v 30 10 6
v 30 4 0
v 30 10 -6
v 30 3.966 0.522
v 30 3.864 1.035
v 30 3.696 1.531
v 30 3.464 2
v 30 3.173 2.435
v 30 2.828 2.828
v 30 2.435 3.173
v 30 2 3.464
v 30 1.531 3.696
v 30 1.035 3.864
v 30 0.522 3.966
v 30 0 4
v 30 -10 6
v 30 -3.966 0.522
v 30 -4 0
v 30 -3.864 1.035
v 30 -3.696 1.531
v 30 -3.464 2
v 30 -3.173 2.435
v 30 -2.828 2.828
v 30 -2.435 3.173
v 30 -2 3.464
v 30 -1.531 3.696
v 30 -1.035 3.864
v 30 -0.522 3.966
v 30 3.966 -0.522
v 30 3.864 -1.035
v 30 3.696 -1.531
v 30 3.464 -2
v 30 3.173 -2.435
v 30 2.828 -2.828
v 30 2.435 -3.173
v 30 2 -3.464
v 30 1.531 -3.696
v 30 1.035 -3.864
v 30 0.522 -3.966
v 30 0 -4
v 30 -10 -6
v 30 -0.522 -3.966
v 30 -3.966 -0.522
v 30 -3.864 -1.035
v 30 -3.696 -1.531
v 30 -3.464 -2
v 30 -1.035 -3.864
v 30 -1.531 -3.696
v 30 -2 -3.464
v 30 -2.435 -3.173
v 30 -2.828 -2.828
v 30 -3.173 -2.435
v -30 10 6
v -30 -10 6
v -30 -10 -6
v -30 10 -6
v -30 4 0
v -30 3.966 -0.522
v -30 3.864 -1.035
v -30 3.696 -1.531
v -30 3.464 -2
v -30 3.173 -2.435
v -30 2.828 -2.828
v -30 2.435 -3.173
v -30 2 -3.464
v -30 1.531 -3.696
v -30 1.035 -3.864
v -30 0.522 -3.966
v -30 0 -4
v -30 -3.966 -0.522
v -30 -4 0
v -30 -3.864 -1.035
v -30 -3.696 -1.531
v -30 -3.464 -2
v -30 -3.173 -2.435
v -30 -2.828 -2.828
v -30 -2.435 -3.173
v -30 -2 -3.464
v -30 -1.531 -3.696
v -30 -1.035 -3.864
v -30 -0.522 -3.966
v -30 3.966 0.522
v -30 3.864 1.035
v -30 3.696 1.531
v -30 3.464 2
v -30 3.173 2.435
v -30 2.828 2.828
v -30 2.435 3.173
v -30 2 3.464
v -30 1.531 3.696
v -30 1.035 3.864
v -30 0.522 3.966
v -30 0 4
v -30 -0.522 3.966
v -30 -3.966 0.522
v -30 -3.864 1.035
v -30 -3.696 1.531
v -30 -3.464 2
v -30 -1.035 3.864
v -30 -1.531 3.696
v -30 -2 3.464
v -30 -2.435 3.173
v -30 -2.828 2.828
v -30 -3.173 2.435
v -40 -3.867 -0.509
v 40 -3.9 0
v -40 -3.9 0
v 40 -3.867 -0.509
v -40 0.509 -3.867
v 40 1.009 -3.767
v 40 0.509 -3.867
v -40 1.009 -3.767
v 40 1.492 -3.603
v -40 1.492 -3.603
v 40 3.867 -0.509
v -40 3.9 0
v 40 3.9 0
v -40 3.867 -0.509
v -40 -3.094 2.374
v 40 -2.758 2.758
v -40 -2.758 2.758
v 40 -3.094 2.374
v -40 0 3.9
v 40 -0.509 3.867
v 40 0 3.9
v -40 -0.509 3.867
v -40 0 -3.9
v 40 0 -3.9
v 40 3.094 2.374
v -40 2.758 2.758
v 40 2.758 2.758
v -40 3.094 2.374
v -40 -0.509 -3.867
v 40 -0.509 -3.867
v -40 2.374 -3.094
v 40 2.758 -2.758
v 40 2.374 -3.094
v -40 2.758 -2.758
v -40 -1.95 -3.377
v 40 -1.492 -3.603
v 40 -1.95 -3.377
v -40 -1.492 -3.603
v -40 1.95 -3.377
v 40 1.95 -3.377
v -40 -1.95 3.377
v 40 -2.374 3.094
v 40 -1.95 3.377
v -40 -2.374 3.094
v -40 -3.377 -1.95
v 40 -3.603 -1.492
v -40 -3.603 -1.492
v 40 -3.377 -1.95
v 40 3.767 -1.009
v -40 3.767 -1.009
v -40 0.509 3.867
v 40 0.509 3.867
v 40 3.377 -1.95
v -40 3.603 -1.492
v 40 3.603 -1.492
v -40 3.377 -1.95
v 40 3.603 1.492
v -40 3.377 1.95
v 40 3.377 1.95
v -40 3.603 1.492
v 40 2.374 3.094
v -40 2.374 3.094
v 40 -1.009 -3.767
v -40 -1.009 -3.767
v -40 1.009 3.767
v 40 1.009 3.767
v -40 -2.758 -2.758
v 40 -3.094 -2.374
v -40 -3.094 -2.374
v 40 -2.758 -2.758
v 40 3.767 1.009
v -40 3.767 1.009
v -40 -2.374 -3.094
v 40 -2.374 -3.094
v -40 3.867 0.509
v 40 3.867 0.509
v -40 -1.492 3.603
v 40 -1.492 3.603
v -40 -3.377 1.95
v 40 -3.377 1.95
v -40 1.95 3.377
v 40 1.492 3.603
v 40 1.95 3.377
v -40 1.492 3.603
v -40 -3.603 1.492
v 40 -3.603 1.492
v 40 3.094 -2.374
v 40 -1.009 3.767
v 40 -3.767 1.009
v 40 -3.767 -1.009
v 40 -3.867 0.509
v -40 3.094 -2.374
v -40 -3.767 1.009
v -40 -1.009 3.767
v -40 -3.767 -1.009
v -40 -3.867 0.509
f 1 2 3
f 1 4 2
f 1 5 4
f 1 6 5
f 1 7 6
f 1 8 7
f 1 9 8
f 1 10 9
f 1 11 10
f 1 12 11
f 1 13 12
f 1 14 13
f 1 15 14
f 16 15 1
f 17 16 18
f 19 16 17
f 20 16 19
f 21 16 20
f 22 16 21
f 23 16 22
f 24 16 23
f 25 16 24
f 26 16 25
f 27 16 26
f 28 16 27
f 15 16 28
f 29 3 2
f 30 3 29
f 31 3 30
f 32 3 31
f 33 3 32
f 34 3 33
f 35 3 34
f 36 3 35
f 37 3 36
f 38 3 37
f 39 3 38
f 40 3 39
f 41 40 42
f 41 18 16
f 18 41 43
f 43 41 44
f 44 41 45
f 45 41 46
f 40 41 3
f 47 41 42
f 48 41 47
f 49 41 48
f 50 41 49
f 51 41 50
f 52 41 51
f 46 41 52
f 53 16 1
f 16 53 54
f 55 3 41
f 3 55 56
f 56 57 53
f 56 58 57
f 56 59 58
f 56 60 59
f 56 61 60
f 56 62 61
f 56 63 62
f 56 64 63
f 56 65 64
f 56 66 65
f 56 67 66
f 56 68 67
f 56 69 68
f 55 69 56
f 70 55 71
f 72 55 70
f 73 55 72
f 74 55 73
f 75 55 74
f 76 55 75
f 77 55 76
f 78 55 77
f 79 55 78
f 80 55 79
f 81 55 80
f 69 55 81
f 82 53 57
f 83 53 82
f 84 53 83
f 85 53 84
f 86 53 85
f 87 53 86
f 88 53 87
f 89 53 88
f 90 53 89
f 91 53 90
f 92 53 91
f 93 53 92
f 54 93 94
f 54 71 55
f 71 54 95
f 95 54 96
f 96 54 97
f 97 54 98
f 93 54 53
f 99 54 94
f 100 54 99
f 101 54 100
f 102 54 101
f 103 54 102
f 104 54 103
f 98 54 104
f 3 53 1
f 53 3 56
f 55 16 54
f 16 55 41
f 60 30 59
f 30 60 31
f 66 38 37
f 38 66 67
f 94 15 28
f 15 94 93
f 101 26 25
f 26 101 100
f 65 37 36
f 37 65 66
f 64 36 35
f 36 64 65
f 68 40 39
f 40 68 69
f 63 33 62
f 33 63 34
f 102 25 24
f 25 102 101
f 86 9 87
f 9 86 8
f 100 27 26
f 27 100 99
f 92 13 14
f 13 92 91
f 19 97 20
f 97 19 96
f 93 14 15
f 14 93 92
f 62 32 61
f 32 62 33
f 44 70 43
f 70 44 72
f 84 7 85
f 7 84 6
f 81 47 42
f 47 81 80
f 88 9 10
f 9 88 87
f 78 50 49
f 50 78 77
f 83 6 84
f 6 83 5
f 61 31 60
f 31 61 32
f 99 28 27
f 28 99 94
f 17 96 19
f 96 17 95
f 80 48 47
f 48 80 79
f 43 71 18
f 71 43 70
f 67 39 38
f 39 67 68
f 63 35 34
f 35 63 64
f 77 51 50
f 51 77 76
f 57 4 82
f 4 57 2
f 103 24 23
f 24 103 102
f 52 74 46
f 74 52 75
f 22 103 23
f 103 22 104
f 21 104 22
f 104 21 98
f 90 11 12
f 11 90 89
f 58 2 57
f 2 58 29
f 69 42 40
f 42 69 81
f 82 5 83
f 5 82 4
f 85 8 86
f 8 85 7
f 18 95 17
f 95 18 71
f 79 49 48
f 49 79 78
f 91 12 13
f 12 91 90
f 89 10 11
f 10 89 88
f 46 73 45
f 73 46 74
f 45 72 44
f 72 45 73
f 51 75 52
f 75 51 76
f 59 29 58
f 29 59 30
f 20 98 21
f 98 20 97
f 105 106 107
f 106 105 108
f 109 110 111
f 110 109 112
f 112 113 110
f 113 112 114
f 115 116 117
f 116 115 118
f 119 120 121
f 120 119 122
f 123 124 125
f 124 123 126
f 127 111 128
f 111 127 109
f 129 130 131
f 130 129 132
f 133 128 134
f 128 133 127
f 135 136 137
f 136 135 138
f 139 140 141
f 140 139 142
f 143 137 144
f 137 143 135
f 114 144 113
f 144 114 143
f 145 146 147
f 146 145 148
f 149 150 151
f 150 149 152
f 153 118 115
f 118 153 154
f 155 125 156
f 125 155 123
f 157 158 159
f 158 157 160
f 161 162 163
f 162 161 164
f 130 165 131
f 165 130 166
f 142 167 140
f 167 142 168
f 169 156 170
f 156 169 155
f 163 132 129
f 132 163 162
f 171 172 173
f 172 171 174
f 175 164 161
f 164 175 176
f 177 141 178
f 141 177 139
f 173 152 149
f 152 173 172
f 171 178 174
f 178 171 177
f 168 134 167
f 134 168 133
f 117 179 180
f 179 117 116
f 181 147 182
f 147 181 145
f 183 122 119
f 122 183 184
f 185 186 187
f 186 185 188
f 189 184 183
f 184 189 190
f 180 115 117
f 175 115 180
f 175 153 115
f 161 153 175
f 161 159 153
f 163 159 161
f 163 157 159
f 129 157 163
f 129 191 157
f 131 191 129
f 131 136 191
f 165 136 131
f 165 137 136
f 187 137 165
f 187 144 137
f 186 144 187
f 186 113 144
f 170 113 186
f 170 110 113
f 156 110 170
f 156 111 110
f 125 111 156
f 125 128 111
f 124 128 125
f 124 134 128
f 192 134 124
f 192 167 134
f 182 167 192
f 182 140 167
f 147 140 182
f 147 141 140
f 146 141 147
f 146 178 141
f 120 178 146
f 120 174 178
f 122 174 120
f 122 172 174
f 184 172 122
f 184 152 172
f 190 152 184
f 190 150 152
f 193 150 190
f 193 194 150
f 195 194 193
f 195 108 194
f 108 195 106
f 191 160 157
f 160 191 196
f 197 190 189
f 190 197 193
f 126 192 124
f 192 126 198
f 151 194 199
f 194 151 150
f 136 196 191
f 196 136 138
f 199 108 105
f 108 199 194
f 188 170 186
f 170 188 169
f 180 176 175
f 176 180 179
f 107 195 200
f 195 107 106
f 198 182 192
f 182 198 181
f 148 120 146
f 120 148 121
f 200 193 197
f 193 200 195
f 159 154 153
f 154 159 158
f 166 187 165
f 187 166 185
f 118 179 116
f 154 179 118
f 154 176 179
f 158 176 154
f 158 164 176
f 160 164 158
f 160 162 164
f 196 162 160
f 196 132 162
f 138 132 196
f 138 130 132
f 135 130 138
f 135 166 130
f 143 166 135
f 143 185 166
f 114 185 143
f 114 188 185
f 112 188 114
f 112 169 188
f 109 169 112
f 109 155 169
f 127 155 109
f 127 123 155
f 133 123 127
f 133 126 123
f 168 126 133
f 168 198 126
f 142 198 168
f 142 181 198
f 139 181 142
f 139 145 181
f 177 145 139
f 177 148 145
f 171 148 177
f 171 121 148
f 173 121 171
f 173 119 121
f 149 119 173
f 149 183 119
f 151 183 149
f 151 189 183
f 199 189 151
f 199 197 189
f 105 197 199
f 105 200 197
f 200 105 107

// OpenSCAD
// Component selector, matching the Onshape SOP pattern.
//   scad2drawing convert samples/selector.scad -D part=frame
//   scad2drawing convert samples/selector.scad -D part=shaft
//   scad2drawing convert samples/selector.scad -D part=assembly

part = "assembly";

module frame() {
    difference() {
        cube([60, 20, 12], center = true);
        rotate([0, 90, 0])
            cylinder(h = 70, d = 8, center = true, $fn = 48);
    }
}

module shaft() {
    rotate([0, 90, 0])
        cylinder(h = 80, d = 7.8, center = true, $fn = 48);
}

module assembly() {
    frame();
    shaft();
}

if (part == "assembly") assembly();
else if (part == "frame") frame();
else if (part == "shaft") shaft();
else assert(false, str("unknown part=", part));
